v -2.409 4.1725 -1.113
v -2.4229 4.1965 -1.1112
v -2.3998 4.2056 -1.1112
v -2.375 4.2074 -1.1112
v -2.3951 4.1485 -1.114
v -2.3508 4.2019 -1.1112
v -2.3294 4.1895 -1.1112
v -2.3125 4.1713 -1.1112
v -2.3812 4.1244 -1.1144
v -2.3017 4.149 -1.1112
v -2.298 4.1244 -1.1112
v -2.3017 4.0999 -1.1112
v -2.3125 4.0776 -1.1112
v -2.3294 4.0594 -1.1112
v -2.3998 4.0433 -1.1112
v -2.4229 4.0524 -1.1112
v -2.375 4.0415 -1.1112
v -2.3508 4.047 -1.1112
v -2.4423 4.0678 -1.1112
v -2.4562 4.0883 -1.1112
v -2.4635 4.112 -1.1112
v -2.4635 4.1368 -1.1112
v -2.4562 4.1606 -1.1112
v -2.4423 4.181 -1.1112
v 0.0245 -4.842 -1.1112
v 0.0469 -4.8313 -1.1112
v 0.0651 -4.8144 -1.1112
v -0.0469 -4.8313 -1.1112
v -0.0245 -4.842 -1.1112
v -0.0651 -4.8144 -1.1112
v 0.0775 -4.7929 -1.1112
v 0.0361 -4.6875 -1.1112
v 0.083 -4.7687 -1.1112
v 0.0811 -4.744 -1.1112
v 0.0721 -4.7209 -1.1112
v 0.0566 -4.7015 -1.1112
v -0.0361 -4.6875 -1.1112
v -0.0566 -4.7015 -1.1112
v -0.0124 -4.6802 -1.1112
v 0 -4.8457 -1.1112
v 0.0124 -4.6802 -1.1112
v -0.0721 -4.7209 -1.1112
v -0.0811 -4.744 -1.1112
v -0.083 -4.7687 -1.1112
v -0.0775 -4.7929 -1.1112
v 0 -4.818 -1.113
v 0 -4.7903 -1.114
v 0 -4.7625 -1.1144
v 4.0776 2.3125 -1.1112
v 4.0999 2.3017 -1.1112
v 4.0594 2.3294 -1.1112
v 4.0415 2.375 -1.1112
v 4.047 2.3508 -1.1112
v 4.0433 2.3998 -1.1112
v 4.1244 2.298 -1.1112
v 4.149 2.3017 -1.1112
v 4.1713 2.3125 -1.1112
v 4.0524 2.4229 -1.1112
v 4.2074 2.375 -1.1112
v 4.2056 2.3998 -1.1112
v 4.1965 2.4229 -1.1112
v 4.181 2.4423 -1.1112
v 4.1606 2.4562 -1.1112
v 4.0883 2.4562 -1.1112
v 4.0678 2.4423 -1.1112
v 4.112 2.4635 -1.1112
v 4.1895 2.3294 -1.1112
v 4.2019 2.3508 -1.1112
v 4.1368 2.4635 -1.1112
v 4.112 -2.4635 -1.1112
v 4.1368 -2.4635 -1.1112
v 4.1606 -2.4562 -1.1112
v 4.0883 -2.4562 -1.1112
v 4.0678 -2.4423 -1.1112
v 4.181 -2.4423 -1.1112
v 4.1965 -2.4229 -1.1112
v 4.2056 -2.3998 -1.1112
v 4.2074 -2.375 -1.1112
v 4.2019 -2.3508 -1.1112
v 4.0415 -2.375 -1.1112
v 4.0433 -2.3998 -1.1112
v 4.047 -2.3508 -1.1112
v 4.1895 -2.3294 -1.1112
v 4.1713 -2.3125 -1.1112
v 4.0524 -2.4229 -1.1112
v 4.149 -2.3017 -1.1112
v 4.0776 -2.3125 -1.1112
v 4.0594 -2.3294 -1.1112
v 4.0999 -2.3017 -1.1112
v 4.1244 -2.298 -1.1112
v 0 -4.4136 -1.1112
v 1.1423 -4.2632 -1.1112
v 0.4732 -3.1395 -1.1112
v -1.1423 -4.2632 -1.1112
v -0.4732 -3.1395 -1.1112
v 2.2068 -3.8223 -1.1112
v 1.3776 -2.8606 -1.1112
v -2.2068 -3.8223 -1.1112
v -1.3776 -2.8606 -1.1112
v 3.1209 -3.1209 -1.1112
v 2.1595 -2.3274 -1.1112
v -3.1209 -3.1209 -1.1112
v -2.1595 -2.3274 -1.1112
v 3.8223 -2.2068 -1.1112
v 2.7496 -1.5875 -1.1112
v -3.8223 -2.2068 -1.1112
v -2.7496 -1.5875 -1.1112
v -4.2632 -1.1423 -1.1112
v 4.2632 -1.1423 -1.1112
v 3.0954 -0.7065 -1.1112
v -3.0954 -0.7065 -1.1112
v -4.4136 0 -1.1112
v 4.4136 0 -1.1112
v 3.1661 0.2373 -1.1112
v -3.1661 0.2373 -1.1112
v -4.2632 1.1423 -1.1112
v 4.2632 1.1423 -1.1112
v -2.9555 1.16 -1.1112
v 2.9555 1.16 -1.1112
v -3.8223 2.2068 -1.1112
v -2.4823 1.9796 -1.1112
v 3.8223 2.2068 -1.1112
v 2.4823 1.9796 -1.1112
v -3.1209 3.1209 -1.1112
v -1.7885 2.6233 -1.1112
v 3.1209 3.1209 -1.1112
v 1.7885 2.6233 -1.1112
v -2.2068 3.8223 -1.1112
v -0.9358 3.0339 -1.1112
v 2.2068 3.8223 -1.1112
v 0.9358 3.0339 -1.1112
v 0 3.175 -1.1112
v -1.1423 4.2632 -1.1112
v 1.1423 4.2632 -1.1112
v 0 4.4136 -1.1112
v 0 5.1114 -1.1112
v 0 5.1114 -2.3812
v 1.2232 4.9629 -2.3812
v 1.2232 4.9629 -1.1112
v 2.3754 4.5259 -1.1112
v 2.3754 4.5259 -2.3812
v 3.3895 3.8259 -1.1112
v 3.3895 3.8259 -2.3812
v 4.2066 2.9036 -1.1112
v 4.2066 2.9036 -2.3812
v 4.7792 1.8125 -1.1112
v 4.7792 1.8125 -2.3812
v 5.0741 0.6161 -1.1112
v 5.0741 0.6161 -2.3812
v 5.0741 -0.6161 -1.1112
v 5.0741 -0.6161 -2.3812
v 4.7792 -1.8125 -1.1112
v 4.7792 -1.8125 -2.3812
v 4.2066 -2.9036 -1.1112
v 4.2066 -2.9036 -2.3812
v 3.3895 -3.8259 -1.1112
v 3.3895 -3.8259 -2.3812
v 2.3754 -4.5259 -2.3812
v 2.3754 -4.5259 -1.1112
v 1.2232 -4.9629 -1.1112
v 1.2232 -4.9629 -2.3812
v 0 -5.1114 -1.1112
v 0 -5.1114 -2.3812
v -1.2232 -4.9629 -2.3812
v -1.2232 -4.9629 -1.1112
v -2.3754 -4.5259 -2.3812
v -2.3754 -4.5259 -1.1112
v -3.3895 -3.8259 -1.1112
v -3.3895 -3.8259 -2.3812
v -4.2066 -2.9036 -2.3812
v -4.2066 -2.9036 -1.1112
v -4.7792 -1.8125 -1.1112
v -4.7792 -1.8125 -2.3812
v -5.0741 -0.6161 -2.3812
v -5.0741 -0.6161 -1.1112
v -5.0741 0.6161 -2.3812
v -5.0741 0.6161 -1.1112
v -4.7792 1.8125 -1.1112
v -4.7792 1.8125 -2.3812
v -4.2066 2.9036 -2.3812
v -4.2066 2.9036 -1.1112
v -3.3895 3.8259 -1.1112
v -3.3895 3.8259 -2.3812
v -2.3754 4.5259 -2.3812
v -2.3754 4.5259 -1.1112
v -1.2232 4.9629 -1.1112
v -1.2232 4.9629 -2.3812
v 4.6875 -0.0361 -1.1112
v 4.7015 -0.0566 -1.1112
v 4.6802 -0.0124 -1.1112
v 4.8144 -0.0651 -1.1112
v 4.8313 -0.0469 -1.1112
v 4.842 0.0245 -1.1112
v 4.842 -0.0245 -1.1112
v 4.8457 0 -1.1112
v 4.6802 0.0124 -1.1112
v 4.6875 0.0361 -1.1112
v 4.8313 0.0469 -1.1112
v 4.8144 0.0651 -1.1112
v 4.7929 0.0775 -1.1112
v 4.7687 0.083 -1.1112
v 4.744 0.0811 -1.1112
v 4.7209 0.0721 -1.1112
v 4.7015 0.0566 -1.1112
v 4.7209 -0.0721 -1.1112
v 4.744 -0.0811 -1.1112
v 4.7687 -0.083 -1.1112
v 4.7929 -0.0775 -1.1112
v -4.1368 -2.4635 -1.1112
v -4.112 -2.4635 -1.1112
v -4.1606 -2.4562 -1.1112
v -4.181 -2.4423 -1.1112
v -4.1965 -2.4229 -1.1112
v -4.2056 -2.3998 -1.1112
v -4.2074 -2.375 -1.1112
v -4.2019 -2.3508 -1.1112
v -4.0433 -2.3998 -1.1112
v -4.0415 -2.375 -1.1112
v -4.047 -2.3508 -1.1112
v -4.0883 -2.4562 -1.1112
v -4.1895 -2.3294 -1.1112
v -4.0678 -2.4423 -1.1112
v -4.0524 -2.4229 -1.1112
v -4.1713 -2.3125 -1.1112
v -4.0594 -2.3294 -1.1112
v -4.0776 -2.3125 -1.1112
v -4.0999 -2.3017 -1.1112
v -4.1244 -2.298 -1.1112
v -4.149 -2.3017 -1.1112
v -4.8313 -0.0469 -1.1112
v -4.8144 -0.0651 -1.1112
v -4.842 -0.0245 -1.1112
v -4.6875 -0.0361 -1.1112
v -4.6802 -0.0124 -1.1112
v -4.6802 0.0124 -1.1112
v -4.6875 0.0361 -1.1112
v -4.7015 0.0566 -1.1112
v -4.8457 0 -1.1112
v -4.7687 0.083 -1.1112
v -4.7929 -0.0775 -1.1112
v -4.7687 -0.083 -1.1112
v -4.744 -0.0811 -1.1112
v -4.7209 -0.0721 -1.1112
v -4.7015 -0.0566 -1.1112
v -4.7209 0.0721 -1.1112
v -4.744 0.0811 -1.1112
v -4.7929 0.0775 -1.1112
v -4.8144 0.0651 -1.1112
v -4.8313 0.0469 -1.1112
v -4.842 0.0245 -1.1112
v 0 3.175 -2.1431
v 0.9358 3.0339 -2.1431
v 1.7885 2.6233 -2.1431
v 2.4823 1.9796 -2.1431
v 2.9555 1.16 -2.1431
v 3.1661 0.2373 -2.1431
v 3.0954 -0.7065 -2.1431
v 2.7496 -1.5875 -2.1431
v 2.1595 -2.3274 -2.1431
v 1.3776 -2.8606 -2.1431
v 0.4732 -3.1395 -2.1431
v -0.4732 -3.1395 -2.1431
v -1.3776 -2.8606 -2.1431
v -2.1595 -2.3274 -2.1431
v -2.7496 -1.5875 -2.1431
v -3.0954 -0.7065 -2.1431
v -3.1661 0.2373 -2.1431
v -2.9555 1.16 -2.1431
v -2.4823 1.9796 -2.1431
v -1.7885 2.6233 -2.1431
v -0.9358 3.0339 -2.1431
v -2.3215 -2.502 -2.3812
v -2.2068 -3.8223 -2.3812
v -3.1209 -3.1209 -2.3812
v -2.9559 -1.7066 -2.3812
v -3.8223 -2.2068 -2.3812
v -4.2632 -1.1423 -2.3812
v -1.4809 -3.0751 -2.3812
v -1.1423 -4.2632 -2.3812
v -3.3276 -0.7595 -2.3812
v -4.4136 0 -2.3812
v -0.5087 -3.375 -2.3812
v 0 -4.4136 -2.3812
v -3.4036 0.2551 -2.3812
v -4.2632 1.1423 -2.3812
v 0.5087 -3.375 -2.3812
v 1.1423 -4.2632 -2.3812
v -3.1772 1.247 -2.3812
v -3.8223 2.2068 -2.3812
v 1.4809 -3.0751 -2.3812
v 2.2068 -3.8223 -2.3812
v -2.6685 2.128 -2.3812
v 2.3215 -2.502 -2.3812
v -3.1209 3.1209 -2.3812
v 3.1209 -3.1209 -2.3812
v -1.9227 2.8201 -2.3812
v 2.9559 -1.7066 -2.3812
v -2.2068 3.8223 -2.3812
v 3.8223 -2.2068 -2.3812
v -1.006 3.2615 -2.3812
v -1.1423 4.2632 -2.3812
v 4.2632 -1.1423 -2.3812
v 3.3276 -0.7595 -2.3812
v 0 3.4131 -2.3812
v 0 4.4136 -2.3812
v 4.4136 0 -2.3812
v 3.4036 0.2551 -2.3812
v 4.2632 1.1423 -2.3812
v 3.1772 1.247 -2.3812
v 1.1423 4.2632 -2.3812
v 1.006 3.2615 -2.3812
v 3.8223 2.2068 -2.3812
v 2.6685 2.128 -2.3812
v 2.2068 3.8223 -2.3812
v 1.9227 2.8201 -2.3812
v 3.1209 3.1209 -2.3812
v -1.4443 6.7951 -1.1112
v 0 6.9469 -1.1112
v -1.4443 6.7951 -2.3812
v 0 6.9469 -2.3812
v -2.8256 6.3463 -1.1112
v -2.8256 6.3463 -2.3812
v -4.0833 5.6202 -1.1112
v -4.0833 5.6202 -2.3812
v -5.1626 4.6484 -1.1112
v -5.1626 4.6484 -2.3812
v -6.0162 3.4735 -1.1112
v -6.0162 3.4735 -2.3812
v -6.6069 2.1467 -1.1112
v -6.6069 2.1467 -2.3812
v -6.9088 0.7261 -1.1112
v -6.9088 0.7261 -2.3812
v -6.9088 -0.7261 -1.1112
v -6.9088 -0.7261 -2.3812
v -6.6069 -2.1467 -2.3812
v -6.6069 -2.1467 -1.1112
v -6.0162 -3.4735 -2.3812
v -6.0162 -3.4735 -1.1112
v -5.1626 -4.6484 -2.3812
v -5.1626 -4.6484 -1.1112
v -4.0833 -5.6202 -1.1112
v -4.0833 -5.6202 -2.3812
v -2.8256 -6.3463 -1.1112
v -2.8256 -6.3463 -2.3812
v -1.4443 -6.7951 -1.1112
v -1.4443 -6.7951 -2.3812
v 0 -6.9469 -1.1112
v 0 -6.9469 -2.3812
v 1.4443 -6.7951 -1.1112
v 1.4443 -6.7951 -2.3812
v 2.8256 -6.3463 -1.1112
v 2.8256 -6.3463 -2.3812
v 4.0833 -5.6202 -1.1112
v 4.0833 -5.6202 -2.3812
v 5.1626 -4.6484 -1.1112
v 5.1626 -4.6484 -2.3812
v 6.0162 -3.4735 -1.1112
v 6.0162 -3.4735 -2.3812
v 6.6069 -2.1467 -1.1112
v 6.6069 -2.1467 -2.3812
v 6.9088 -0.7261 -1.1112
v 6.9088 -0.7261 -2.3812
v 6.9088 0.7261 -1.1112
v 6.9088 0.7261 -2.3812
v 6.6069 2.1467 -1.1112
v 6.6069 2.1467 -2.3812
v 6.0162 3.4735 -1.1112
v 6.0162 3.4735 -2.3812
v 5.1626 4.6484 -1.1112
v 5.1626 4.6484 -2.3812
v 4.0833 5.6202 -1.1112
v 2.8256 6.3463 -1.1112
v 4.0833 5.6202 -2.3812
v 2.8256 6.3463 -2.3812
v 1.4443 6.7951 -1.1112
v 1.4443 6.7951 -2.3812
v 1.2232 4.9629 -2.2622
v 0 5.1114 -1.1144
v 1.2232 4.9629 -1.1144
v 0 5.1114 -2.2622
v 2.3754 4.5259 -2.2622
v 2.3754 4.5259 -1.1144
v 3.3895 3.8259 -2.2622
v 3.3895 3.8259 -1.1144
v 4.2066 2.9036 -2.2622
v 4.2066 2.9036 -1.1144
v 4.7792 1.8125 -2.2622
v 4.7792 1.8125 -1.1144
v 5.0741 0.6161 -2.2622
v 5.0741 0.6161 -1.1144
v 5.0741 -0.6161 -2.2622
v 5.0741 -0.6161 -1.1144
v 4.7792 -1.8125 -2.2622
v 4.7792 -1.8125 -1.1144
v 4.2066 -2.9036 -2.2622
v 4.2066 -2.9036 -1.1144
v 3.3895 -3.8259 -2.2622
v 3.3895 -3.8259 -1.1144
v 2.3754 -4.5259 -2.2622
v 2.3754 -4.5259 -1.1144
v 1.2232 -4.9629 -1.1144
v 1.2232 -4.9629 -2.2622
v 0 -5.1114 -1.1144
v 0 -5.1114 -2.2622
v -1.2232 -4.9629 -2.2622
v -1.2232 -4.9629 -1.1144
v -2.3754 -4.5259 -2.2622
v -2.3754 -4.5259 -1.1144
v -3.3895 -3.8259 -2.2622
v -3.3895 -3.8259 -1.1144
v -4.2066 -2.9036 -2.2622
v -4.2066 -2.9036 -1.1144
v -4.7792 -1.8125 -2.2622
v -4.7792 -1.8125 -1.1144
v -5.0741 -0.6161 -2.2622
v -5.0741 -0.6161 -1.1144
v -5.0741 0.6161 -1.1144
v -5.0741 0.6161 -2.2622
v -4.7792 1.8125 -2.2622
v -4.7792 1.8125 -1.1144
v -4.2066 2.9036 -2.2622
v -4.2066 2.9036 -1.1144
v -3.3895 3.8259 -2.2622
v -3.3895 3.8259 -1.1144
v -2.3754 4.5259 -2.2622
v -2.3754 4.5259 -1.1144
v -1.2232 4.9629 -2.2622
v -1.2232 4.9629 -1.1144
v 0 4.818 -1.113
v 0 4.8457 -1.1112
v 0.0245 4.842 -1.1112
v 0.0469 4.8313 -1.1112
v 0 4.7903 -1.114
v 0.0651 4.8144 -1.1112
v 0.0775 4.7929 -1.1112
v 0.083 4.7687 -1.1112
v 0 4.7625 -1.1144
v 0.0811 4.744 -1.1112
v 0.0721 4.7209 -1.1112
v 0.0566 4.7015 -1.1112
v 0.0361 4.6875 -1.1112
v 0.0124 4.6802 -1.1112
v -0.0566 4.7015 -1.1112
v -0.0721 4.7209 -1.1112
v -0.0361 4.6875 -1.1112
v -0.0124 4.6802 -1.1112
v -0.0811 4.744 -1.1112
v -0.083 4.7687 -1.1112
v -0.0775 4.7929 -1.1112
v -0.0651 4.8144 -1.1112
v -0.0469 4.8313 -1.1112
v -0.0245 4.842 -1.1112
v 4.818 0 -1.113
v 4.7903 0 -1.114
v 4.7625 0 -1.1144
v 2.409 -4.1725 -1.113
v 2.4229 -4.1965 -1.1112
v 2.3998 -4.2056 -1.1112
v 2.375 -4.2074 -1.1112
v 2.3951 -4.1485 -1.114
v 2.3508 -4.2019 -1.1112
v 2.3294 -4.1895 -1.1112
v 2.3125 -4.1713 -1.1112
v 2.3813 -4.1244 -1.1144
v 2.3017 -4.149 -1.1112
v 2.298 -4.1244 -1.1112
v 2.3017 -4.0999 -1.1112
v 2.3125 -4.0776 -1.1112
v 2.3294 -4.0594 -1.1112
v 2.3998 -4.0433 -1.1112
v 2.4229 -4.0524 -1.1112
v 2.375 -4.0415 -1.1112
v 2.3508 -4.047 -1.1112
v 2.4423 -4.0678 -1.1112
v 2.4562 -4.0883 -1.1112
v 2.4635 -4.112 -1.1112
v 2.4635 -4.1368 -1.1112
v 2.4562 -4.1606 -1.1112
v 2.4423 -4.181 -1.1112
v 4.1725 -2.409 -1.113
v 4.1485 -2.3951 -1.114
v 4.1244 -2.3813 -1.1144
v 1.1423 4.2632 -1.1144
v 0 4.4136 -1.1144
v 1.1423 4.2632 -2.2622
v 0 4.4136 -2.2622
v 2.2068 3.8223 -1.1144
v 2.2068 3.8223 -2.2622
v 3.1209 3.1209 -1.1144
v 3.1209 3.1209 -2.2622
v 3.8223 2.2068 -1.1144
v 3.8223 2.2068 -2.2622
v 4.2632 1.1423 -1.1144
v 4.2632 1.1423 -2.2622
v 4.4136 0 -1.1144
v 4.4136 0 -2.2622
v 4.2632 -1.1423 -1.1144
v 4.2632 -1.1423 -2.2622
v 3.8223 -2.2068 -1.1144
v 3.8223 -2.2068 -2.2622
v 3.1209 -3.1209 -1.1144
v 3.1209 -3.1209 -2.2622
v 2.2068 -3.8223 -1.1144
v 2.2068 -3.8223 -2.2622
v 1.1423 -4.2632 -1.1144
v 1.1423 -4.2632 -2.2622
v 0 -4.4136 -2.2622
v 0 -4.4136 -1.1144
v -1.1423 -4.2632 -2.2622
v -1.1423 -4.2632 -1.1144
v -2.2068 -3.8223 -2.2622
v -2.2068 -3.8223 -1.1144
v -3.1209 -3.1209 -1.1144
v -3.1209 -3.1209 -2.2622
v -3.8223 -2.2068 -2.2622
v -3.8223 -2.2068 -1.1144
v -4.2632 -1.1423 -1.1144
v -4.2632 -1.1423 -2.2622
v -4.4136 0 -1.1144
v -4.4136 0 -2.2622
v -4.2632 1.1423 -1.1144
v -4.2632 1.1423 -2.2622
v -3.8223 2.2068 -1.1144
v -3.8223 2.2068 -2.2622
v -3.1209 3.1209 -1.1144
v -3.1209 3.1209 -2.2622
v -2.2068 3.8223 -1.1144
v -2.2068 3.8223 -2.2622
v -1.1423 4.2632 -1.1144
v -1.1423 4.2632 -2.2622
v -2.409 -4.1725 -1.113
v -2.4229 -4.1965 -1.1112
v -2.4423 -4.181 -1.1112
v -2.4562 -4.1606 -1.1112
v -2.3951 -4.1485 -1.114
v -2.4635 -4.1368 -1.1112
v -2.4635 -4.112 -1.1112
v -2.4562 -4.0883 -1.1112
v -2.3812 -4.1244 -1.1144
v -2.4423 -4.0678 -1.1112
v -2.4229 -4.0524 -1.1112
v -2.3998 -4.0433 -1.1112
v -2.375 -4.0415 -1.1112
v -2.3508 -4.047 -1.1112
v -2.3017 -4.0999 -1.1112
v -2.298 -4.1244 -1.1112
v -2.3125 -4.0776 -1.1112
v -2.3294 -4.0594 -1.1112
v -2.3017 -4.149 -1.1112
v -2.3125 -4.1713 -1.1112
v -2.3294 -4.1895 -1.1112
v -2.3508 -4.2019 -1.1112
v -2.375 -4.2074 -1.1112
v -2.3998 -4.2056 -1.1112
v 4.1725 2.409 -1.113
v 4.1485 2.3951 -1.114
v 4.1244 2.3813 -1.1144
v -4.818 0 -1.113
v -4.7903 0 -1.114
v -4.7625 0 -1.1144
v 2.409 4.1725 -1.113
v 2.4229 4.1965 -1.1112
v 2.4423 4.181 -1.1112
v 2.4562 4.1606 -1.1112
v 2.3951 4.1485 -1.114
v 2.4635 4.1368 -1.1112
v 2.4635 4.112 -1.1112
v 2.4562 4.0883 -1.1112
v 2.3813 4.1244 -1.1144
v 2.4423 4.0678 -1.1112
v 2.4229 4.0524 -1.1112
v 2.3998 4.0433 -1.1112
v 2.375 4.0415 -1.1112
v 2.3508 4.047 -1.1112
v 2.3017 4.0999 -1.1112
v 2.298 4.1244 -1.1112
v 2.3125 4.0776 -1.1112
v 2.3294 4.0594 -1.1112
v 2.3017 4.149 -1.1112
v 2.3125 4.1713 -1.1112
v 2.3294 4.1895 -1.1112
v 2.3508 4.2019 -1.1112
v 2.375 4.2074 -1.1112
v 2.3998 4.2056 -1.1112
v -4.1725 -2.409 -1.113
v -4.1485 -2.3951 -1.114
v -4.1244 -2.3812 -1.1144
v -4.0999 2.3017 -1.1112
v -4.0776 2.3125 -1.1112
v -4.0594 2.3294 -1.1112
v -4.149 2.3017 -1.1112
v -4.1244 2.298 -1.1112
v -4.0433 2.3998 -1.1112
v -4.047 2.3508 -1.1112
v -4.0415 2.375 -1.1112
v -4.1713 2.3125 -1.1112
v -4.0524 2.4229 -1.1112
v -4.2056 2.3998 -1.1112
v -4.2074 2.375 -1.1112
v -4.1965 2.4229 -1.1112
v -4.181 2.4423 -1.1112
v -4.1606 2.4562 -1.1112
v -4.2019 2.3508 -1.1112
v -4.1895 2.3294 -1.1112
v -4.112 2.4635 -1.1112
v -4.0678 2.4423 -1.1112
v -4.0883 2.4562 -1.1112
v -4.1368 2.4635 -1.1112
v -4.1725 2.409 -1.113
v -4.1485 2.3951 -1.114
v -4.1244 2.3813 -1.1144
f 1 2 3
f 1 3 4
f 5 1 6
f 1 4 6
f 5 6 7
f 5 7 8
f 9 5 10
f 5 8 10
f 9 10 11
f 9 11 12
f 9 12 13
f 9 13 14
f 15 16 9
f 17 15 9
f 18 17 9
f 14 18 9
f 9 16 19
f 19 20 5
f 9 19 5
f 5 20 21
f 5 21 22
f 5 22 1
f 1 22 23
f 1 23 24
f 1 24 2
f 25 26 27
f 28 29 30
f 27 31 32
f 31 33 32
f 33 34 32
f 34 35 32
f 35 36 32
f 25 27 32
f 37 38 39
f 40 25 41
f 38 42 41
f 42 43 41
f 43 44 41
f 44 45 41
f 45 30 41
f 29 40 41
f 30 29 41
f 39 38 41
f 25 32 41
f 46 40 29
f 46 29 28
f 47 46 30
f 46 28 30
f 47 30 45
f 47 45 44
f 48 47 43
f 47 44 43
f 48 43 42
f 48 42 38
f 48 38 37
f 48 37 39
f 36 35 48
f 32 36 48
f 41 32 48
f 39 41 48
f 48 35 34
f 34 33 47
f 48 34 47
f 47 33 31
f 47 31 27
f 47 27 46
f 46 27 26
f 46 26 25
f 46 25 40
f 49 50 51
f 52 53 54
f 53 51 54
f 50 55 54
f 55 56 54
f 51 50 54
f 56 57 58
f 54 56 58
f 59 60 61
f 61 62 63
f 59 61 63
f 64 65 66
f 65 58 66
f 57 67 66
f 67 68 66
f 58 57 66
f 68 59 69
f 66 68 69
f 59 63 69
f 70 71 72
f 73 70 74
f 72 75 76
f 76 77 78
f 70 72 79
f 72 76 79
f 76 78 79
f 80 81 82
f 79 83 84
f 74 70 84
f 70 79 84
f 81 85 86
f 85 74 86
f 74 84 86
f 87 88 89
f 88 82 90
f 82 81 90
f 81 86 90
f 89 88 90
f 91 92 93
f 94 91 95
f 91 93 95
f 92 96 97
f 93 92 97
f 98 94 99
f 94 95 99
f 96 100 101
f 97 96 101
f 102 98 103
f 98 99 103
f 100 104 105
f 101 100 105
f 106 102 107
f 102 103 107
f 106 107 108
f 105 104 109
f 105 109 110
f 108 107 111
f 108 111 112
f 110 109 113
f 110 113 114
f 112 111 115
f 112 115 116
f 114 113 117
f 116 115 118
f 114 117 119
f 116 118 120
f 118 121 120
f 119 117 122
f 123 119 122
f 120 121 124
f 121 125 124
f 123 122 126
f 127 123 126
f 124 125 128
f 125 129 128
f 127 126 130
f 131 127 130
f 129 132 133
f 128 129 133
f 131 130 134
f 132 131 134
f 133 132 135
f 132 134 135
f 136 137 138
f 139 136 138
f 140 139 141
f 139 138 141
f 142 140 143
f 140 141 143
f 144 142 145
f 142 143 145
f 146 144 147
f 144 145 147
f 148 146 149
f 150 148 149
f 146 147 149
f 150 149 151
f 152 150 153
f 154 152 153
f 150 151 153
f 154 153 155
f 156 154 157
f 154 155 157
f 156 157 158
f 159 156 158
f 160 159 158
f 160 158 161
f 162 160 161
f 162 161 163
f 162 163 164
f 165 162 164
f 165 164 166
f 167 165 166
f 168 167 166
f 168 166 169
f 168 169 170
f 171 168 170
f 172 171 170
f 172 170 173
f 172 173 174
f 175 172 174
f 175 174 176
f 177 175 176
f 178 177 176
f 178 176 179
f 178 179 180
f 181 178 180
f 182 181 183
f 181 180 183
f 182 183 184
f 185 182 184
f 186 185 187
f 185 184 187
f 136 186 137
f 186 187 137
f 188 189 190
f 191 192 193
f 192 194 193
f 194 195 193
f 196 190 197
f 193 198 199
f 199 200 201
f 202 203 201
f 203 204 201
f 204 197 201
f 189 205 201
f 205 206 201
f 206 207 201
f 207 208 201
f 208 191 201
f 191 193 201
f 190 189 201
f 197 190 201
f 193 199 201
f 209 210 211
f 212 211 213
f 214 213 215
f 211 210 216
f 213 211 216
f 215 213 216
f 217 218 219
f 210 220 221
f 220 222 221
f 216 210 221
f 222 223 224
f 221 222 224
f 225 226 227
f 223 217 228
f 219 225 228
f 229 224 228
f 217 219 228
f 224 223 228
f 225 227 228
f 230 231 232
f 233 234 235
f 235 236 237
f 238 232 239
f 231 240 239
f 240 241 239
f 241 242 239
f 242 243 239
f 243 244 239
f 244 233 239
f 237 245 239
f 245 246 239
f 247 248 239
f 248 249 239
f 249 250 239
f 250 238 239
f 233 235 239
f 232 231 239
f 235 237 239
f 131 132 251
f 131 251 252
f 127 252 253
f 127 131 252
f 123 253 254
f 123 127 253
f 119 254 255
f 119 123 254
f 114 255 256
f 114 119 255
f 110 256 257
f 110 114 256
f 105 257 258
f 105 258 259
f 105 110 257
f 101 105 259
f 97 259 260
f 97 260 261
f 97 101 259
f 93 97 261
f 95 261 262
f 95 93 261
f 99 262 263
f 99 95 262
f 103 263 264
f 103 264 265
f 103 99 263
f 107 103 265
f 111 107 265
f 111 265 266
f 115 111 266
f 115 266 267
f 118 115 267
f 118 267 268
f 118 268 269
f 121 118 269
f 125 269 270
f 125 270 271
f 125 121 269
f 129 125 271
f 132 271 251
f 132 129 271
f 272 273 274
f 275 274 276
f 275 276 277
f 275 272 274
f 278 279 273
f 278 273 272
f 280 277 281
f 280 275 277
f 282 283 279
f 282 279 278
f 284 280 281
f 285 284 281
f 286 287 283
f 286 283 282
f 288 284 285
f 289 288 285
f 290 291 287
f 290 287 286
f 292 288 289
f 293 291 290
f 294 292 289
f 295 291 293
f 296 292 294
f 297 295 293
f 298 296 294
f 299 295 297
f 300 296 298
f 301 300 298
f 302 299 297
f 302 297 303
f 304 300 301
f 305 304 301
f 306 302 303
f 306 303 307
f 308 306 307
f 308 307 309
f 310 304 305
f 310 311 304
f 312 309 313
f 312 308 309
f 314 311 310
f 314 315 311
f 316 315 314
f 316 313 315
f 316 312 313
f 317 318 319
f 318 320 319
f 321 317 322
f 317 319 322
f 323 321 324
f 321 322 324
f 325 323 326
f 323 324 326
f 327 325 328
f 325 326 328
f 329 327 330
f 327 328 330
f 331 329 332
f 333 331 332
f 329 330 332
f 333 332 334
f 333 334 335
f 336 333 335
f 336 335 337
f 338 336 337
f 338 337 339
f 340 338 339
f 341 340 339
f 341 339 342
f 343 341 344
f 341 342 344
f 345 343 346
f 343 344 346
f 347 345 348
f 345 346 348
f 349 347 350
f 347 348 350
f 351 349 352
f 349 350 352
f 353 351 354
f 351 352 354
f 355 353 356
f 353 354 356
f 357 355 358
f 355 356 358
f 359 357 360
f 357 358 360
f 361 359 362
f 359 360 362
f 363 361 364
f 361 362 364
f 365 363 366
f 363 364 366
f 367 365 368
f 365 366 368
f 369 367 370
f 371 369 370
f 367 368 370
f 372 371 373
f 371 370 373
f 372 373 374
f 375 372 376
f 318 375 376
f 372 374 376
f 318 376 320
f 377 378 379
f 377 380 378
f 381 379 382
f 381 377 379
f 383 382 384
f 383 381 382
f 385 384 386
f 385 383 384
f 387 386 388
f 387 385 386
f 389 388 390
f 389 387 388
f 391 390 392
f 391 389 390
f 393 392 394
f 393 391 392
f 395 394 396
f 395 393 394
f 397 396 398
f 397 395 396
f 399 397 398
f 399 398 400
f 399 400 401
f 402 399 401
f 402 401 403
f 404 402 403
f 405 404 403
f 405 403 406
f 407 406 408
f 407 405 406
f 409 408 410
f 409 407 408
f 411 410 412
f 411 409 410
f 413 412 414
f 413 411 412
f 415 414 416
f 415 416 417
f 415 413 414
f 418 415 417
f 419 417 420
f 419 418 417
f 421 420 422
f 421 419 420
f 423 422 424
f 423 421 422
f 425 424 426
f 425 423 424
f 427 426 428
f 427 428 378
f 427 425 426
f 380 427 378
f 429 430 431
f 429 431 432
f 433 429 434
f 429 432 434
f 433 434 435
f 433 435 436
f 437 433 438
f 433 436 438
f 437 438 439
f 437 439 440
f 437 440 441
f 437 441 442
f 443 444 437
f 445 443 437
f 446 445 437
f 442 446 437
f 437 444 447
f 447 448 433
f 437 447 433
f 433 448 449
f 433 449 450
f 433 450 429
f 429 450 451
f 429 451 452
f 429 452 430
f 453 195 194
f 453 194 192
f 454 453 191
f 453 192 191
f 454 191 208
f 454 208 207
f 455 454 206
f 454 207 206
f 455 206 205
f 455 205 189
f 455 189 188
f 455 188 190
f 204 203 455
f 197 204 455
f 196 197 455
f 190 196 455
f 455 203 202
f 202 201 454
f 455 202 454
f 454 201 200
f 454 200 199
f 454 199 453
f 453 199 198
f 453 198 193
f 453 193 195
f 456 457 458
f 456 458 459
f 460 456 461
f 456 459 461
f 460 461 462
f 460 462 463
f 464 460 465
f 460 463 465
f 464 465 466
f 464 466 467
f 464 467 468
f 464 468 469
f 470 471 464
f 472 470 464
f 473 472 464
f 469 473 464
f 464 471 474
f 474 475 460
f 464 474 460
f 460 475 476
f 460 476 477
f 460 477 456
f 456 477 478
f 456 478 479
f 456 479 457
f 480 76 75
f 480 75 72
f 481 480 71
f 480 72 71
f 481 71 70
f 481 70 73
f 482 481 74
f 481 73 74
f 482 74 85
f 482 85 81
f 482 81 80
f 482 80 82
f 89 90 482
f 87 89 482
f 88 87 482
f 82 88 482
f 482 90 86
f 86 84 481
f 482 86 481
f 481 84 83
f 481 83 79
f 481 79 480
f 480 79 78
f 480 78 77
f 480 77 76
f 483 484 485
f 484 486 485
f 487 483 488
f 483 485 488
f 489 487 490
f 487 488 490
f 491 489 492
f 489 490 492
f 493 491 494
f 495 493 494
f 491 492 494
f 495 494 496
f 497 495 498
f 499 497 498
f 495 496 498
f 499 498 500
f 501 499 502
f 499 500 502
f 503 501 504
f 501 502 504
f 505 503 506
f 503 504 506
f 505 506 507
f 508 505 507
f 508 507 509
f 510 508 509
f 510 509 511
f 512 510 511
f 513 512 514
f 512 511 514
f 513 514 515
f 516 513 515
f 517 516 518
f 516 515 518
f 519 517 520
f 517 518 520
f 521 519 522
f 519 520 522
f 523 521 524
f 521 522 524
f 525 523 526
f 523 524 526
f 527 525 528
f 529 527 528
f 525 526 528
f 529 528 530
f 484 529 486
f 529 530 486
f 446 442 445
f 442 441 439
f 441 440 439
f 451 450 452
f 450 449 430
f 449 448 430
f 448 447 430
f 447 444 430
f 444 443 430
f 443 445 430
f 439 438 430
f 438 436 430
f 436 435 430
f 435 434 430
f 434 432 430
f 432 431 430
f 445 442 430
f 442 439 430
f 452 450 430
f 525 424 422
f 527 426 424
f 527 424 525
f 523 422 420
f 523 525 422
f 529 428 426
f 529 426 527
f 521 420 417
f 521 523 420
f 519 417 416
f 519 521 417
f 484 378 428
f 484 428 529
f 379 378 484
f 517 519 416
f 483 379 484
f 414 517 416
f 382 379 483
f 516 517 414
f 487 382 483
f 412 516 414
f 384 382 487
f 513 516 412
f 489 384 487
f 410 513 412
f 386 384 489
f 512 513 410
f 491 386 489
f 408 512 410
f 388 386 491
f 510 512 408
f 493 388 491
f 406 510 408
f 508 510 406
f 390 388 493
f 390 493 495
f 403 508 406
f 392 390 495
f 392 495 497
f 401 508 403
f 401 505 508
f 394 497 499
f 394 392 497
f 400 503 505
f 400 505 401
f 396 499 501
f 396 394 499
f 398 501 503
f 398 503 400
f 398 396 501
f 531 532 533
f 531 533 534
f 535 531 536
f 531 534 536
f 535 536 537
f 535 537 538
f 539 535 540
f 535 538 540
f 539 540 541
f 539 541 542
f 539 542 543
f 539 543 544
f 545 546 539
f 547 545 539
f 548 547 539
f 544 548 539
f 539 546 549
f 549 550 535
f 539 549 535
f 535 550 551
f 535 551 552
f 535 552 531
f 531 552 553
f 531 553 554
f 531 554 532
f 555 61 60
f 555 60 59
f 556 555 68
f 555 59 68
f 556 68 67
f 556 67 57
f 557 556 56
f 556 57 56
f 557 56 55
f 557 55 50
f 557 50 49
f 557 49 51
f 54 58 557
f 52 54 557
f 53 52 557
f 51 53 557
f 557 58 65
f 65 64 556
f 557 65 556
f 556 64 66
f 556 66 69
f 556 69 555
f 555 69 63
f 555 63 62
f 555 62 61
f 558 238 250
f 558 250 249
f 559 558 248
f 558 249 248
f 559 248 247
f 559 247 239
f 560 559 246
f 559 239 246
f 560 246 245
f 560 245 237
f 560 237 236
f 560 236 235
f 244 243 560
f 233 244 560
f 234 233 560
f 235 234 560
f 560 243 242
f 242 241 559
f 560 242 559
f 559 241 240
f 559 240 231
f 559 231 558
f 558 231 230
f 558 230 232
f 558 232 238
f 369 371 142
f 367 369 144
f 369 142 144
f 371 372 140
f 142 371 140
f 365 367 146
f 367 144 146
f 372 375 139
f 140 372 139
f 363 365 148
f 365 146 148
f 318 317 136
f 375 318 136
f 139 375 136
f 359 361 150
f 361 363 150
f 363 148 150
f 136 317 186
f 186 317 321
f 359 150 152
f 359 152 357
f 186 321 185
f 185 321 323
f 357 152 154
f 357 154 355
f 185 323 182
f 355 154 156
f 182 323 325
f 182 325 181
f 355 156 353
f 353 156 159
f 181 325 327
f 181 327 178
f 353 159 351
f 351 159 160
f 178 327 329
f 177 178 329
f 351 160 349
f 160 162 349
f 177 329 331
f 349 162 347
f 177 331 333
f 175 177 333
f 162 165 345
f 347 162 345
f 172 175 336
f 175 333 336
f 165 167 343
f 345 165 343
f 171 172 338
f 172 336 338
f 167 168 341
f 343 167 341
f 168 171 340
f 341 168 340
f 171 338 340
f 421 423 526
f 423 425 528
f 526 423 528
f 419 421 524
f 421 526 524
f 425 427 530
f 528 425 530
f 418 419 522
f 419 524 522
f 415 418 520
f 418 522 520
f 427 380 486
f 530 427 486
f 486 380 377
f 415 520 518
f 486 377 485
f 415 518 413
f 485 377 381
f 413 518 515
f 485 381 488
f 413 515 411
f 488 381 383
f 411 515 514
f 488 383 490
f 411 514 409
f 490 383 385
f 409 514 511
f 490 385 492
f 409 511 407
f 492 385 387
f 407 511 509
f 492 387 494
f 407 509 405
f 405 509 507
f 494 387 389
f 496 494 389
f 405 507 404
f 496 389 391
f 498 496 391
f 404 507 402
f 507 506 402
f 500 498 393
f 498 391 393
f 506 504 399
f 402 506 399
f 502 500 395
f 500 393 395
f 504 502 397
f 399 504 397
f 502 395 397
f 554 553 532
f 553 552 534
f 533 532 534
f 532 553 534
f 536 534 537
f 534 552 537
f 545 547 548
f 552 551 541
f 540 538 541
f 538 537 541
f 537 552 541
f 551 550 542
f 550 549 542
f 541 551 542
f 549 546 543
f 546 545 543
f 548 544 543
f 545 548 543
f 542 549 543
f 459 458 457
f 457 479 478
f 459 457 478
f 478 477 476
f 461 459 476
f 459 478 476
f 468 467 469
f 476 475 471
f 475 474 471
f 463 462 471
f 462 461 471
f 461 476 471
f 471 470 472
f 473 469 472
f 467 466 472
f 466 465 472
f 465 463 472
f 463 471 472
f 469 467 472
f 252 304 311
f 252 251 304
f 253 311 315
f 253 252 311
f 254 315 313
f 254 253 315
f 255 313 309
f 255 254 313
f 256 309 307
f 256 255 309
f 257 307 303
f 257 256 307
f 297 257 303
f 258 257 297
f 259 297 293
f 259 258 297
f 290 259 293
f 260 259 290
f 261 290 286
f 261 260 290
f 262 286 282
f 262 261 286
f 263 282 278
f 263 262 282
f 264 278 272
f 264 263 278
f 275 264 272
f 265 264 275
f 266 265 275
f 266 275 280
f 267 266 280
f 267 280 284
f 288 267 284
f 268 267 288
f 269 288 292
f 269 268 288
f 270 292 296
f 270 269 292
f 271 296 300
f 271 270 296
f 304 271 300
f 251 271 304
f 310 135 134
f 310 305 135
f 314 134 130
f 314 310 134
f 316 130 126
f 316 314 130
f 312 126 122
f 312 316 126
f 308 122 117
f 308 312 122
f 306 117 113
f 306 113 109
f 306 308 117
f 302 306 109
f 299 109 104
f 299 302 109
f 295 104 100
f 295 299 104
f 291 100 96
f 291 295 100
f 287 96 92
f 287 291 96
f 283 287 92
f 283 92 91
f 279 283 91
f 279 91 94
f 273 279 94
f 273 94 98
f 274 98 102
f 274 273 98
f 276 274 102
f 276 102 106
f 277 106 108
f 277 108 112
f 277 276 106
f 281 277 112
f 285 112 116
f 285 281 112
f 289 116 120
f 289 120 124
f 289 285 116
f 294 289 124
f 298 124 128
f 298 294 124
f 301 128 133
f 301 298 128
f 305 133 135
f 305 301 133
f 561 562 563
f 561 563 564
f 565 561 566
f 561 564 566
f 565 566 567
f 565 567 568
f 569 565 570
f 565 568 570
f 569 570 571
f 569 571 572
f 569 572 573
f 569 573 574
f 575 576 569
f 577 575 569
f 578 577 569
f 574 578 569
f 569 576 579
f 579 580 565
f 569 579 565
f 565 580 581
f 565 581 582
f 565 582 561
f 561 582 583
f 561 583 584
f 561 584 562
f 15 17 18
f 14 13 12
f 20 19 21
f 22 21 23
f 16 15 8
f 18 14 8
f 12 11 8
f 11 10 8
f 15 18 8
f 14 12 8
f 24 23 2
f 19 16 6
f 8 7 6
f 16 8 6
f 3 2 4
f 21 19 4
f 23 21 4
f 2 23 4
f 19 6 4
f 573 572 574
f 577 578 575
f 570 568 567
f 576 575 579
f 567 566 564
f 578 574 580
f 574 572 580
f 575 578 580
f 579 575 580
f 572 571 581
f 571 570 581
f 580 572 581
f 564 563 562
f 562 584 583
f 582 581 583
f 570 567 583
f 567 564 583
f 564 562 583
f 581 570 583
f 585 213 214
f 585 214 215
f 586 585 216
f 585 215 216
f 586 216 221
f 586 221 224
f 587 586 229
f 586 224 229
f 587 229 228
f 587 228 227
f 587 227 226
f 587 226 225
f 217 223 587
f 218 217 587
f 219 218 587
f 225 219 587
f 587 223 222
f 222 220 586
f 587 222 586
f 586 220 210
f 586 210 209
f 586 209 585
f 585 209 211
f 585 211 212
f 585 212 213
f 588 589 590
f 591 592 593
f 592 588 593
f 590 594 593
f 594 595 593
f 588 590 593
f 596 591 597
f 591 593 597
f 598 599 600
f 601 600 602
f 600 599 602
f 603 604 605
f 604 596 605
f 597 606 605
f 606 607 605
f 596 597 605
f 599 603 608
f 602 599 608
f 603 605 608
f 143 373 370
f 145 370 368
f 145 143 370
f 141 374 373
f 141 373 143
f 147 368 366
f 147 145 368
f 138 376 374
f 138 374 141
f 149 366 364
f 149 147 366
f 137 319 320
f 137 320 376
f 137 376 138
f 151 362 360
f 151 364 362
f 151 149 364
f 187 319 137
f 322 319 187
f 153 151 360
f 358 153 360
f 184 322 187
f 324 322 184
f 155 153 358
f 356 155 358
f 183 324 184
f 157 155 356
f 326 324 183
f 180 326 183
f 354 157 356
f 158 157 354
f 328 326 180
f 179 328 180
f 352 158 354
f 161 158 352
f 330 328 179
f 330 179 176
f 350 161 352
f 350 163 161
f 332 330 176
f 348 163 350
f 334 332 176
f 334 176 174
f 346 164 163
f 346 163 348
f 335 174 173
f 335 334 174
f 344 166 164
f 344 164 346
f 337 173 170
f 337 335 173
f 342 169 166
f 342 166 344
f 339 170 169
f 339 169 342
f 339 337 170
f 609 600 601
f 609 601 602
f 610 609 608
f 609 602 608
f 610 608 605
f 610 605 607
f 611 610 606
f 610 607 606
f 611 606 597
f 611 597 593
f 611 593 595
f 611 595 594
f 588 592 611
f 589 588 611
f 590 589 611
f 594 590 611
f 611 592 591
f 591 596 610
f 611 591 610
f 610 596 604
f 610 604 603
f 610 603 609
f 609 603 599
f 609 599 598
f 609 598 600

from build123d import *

# Parameters (mm, degrees)
CIRPATTERN1_COUNT  = 12
SKETCH5_W          = 1.147826059
SKETCH5_H          = 0.697802198
SKETCH6_W          = 1.27
SKETCH6_H          = 1.835498901
SKETCH7_R          = 6.35
CUT_EXTRUDE1_DEPTH = 21.692531665


with BuildPart() as part:
    # Sketch1 → Revolve1 (revolve)
    with BuildSketch(Plane(origin=(0, 0, 0), x_dir=(0, 0, -1), z_dir=(1, 0, 0))):
        with BuildLine():
            Line((2.143125, 6.35), (-2.143125, 6.35))
            Line((-2.143125, 6.35), (-2.38125, 6.111875))
            Line((-2.38125, 6.111875), (-2.38125, 5.111401099))
            Line((-2.38125, 5.111401099), (-1.058333333, 5.111401099))
            ThreePointArc((-1.058333333, 5.111401099), (0, 5.876861441), (1.058333333, 5.111401099))
            Line((1.058333333, 5.111401099), (2.38125, 5.111401099))
            Line((2.38125, 5.111401099), (2.38125, 6.111875))
            Line((2.38125, 6.111875), (2.143125, 6.35))
        make_face()
    revolve(axis=Axis((0, 0, 2.38125), (0, 0, -1)))

    # Sketch6 → Revolve6 (revolve)
    with BuildSketch(Plane(origin=(0, 0, 0), x_dir=(0, 0, -1), z_dir=(1, 0, 0))):
        with Locations((1.74625, 6.02915055)):
            Rectangle(SKETCH6_W, SKETCH6_H)
    revolve(axis=Axis((0, 0, -2.38125), (0, 0, 1)))


with BuildPart() as body_2:
    # Sketch3 → Revolve3 (revolve)
    with BuildSketch(Plane(origin=(0, 0, 0), x_dir=(0, 0, -1), z_dir=(1, 0, 0))):
        with BuildLine():
            Line((-2.38125, 4.413598901), (-1.058333333, 4.413598901))
            ThreePointArc((-1.058333333, 4.413598901), (0, 3.648138559), (1.058333333, 4.413598901))
            Line((1.058333333, 4.413598901), (2.38125, 4.413598901))
            Line((2.38125, 4.413598901), (2.38125, 3.413125))
            Line((2.38125, 3.413125), (2.143125, 3.175))
            Line((2.143125, 3.175), (-2.143125, 3.175))
            Line((-2.143125, 3.175), (-2.38125, 3.413125))
            Line((-2.38125, 3.413125), (-2.38125, 4.413598901))
        make_face()
    revolve(axis=Axis((0, 0, 2.38125), (0, 0, -1)))


with BuildPart() as body_3:
    # Sketch4 → Revolve4 (revolve)
    with BuildSketch(Plane(origin=(0, 0, 0), x_dir=(0, 0, -1), z_dir=(1, 0, 0))):
        with BuildLine():
            Line((-1.114361441, 4.7625), (1.114361441, 4.7625))
            ThreePointArc((1.114361441, 4.7625), (0, 5.876861441), (-1.114361441, 4.7625))
        make_face()
    revolve(axis=Axis((0, 4.7625, 1.114361441), (0, 0, -1)))


with BuildPart() as cirpattern1_1:
    # CirPattern1: pattern copy
    add(body_3.part.rotate(Axis((0, 0, -2.38125), (0, 0, 1)), 1 * 360 / CIRPATTERN1_COUNT))


with BuildPart() as cirpattern1_2:
    # CirPattern1: pattern copy
    add(body_3.part.rotate(Axis((0, 0, -2.38125), (0, 0, 1)), 2 * 360 / CIRPATTERN1_COUNT))


with BuildPart() as cirpattern1_3:
    # CirPattern1: pattern copy
    add(body_3.part.rotate(Axis((0, 0, -2.38125), (0, 0, 1)), 3 * 360 / CIRPATTERN1_COUNT))


with BuildPart() as cirpattern1_4:
    # CirPattern1: pattern copy
    add(body_3.part.rotate(Axis((0, 0, -2.38125), (0, 0, 1)), 4 * 360 / CIRPATTERN1_COUNT))


with BuildPart() as cirpattern1_5:
    # CirPattern1: pattern copy
    add(body_3.part.rotate(Axis((0, 0, -2.38125), (0, 0, 1)), 5 * 360 / CIRPATTERN1_COUNT))


with BuildPart() as cirpattern1_6:
    # CirPattern1: pattern copy
    add(body_3.part.rotate(Axis((0, 0, -2.38125), (0, 0, 1)), 6 * 360 / CIRPATTERN1_COUNT))


with BuildPart() as cirpattern1_7:
    # CirPattern1: pattern copy
    add(body_3.part.rotate(Axis((0, 0, -2.38125), (0, 0, 1)), 7 * 360 / CIRPATTERN1_COUNT))


with BuildPart() as cirpattern1_8:
    # CirPattern1: pattern copy
    add(body_3.part.rotate(Axis((0, 0, -2.38125), (0, 0, 1)), 8 * 360 / CIRPATTERN1_COUNT))


with BuildPart() as cirpattern1_9:
    # CirPattern1: pattern copy
    add(body_3.part.rotate(Axis((0, 0, -2.38125), (0, 0, 1)), 9 * 360 / CIRPATTERN1_COUNT))


with BuildPart() as cirpattern1_10:
    # CirPattern1: pattern copy
    add(body_3.part.rotate(Axis((0, 0, -2.38125), (0, 0, 1)), 10 * 360 / CIRPATTERN1_COUNT))


with BuildPart() as cirpattern1_11:
    # CirPattern1: pattern copy
    add(body_3.part.rotate(Axis((0, 0, -2.38125), (0, 0, 1)), 11 * 360 / CIRPATTERN1_COUNT))


with BuildPart() as body_15:
    # Sketch5 → Revolve5 (revolve)
    with BuildSketch(Plane(origin=(0, 0, 0), x_dir=(0, 0, -1), z_dir=(1, 0, 0))):
        with Locations((-1.688274471, 4.7625)):
            Rectangle(SKETCH5_W, SKETCH5_H)
        with Locations((1.688274471, 4.7625)):
            Rectangle(SKETCH5_W, SKETCH5_H)
    revolve(axis=Axis((0, 0, 2.38125), (0, 0, -1)))


with BuildPart() as cut_extrude1_tool:
    # Sketch7 → Cut-Extrude1 (new, through all)
    with BuildSketch(Plane(origin=(-4.885869902, 9.665410703, -1.11125), x_dir=(-0.7071067811865512, 0.7071067811865439, 0), z_dir=(0, 0, -1))):
        with Locations((-10.289309191, -3.379645711)):
            Circle(SKETCH7_R)
    extrude(amount=-CUT_EXTRUDE1_DEPTH)


with BuildPart() as part_1:
    add(part.part)

    # Cut-Extrude1: cut by cut_extrude1_tool
    add(cut_extrude1_tool.part, mode=Mode.SUBTRACT)


with BuildPart() as body_2_1:
    add(body_2.part)

    # Cut-Extrude1: cut by cut_extrude1_tool
    add(cut_extrude1_tool.part, mode=Mode.SUBTRACT)


with BuildPart() as body_3_1:
    add(body_3.part)

    # Cut-Extrude1: cut by cut_extrude1_tool
    add(cut_extrude1_tool.part, mode=Mode.SUBTRACT)


with BuildPart() as cirpattern1_1_1:
    add(cirpattern1_1.part)

    # Cut-Extrude1: cut by cut_extrude1_tool
    add(cut_extrude1_tool.part, mode=Mode.SUBTRACT)


with BuildPart() as cirpattern1_2_1:
    add(cirpattern1_2.part)

    # Cut-Extrude1: cut by cut_extrude1_tool
    add(cut_extrude1_tool.part, mode=Mode.SUBTRACT)


with BuildPart() as cirpattern1_3_1:
    add(cirpattern1_3.part)

    # Cut-Extrude1: cut by cut_extrude1_tool
    add(cut_extrude1_tool.part, mode=Mode.SUBTRACT)


with BuildPart() as cirpattern1_4_1:
    add(cirpattern1_4.part)

    # Cut-Extrude1: cut by cut_extrude1_tool
    add(cut_extrude1_tool.part, mode=Mode.SUBTRACT)


with BuildPart() as cirpattern1_5_1:
    add(cirpattern1_5.part)

    # Cut-Extrude1: cut by cut_extrude1_tool
    add(cut_extrude1_tool.part, mode=Mode.SUBTRACT)


with BuildPart() as cirpattern1_6_1:
    add(cirpattern1_6.part)

    # Cut-Extrude1: cut by cut_extrude1_tool
    add(cut_extrude1_tool.part, mode=Mode.SUBTRACT)


with BuildPart() as cirpattern1_7_1:
    add(cirpattern1_7.part)

    # Cut-Extrude1: cut by cut_extrude1_tool
    add(cut_extrude1_tool.part, mode=Mode.SUBTRACT)


with BuildPart() as cirpattern1_8_1:
    add(cirpattern1_8.part)

    # Cut-Extrude1: cut by cut_extrude1_tool
    add(cut_extrude1_tool.part, mode=Mode.SUBTRACT)


with BuildPart() as cirpattern1_9_1:
    add(cirpattern1_9.part)

    # Cut-Extrude1: cut by cut_extrude1_tool
    add(cut_extrude1_tool.part, mode=Mode.SUBTRACT)


with BuildPart() as cirpattern1_10_1:
    add(cirpattern1_10.part)

    # Cut-Extrude1: cut by cut_extrude1_tool
    add(cut_extrude1_tool.part, mode=Mode.SUBTRACT)


with BuildPart() as cirpattern1_11_1:
    add(cirpattern1_11.part)

    # Cut-Extrude1: cut by cut_extrude1_tool
    add(cut_extrude1_tool.part, mode=Mode.SUBTRACT)


with BuildPart() as body_15_1:
    add(body_15.part)

    # Cut-Extrude1: cut by cut_extrude1_tool
    add(cut_extrude1_tool.part, mode=Mode.SUBTRACT)


solid = Compound([part_1.part, body_2_1.part, body_3_1.part, cirpattern1_1_1.part, cirpattern1_2_1.part, cirpattern1_3_1.part, cirpattern1_4_1.part, cirpattern1_5_1.part, cirpattern1_6_1.part, cirpattern1_7_1.part, cirpattern1_8_1.part, cirpattern1_9_1.part, cirpattern1_10_1.part, cirpattern1_11_1.part, body_15_1.part])
